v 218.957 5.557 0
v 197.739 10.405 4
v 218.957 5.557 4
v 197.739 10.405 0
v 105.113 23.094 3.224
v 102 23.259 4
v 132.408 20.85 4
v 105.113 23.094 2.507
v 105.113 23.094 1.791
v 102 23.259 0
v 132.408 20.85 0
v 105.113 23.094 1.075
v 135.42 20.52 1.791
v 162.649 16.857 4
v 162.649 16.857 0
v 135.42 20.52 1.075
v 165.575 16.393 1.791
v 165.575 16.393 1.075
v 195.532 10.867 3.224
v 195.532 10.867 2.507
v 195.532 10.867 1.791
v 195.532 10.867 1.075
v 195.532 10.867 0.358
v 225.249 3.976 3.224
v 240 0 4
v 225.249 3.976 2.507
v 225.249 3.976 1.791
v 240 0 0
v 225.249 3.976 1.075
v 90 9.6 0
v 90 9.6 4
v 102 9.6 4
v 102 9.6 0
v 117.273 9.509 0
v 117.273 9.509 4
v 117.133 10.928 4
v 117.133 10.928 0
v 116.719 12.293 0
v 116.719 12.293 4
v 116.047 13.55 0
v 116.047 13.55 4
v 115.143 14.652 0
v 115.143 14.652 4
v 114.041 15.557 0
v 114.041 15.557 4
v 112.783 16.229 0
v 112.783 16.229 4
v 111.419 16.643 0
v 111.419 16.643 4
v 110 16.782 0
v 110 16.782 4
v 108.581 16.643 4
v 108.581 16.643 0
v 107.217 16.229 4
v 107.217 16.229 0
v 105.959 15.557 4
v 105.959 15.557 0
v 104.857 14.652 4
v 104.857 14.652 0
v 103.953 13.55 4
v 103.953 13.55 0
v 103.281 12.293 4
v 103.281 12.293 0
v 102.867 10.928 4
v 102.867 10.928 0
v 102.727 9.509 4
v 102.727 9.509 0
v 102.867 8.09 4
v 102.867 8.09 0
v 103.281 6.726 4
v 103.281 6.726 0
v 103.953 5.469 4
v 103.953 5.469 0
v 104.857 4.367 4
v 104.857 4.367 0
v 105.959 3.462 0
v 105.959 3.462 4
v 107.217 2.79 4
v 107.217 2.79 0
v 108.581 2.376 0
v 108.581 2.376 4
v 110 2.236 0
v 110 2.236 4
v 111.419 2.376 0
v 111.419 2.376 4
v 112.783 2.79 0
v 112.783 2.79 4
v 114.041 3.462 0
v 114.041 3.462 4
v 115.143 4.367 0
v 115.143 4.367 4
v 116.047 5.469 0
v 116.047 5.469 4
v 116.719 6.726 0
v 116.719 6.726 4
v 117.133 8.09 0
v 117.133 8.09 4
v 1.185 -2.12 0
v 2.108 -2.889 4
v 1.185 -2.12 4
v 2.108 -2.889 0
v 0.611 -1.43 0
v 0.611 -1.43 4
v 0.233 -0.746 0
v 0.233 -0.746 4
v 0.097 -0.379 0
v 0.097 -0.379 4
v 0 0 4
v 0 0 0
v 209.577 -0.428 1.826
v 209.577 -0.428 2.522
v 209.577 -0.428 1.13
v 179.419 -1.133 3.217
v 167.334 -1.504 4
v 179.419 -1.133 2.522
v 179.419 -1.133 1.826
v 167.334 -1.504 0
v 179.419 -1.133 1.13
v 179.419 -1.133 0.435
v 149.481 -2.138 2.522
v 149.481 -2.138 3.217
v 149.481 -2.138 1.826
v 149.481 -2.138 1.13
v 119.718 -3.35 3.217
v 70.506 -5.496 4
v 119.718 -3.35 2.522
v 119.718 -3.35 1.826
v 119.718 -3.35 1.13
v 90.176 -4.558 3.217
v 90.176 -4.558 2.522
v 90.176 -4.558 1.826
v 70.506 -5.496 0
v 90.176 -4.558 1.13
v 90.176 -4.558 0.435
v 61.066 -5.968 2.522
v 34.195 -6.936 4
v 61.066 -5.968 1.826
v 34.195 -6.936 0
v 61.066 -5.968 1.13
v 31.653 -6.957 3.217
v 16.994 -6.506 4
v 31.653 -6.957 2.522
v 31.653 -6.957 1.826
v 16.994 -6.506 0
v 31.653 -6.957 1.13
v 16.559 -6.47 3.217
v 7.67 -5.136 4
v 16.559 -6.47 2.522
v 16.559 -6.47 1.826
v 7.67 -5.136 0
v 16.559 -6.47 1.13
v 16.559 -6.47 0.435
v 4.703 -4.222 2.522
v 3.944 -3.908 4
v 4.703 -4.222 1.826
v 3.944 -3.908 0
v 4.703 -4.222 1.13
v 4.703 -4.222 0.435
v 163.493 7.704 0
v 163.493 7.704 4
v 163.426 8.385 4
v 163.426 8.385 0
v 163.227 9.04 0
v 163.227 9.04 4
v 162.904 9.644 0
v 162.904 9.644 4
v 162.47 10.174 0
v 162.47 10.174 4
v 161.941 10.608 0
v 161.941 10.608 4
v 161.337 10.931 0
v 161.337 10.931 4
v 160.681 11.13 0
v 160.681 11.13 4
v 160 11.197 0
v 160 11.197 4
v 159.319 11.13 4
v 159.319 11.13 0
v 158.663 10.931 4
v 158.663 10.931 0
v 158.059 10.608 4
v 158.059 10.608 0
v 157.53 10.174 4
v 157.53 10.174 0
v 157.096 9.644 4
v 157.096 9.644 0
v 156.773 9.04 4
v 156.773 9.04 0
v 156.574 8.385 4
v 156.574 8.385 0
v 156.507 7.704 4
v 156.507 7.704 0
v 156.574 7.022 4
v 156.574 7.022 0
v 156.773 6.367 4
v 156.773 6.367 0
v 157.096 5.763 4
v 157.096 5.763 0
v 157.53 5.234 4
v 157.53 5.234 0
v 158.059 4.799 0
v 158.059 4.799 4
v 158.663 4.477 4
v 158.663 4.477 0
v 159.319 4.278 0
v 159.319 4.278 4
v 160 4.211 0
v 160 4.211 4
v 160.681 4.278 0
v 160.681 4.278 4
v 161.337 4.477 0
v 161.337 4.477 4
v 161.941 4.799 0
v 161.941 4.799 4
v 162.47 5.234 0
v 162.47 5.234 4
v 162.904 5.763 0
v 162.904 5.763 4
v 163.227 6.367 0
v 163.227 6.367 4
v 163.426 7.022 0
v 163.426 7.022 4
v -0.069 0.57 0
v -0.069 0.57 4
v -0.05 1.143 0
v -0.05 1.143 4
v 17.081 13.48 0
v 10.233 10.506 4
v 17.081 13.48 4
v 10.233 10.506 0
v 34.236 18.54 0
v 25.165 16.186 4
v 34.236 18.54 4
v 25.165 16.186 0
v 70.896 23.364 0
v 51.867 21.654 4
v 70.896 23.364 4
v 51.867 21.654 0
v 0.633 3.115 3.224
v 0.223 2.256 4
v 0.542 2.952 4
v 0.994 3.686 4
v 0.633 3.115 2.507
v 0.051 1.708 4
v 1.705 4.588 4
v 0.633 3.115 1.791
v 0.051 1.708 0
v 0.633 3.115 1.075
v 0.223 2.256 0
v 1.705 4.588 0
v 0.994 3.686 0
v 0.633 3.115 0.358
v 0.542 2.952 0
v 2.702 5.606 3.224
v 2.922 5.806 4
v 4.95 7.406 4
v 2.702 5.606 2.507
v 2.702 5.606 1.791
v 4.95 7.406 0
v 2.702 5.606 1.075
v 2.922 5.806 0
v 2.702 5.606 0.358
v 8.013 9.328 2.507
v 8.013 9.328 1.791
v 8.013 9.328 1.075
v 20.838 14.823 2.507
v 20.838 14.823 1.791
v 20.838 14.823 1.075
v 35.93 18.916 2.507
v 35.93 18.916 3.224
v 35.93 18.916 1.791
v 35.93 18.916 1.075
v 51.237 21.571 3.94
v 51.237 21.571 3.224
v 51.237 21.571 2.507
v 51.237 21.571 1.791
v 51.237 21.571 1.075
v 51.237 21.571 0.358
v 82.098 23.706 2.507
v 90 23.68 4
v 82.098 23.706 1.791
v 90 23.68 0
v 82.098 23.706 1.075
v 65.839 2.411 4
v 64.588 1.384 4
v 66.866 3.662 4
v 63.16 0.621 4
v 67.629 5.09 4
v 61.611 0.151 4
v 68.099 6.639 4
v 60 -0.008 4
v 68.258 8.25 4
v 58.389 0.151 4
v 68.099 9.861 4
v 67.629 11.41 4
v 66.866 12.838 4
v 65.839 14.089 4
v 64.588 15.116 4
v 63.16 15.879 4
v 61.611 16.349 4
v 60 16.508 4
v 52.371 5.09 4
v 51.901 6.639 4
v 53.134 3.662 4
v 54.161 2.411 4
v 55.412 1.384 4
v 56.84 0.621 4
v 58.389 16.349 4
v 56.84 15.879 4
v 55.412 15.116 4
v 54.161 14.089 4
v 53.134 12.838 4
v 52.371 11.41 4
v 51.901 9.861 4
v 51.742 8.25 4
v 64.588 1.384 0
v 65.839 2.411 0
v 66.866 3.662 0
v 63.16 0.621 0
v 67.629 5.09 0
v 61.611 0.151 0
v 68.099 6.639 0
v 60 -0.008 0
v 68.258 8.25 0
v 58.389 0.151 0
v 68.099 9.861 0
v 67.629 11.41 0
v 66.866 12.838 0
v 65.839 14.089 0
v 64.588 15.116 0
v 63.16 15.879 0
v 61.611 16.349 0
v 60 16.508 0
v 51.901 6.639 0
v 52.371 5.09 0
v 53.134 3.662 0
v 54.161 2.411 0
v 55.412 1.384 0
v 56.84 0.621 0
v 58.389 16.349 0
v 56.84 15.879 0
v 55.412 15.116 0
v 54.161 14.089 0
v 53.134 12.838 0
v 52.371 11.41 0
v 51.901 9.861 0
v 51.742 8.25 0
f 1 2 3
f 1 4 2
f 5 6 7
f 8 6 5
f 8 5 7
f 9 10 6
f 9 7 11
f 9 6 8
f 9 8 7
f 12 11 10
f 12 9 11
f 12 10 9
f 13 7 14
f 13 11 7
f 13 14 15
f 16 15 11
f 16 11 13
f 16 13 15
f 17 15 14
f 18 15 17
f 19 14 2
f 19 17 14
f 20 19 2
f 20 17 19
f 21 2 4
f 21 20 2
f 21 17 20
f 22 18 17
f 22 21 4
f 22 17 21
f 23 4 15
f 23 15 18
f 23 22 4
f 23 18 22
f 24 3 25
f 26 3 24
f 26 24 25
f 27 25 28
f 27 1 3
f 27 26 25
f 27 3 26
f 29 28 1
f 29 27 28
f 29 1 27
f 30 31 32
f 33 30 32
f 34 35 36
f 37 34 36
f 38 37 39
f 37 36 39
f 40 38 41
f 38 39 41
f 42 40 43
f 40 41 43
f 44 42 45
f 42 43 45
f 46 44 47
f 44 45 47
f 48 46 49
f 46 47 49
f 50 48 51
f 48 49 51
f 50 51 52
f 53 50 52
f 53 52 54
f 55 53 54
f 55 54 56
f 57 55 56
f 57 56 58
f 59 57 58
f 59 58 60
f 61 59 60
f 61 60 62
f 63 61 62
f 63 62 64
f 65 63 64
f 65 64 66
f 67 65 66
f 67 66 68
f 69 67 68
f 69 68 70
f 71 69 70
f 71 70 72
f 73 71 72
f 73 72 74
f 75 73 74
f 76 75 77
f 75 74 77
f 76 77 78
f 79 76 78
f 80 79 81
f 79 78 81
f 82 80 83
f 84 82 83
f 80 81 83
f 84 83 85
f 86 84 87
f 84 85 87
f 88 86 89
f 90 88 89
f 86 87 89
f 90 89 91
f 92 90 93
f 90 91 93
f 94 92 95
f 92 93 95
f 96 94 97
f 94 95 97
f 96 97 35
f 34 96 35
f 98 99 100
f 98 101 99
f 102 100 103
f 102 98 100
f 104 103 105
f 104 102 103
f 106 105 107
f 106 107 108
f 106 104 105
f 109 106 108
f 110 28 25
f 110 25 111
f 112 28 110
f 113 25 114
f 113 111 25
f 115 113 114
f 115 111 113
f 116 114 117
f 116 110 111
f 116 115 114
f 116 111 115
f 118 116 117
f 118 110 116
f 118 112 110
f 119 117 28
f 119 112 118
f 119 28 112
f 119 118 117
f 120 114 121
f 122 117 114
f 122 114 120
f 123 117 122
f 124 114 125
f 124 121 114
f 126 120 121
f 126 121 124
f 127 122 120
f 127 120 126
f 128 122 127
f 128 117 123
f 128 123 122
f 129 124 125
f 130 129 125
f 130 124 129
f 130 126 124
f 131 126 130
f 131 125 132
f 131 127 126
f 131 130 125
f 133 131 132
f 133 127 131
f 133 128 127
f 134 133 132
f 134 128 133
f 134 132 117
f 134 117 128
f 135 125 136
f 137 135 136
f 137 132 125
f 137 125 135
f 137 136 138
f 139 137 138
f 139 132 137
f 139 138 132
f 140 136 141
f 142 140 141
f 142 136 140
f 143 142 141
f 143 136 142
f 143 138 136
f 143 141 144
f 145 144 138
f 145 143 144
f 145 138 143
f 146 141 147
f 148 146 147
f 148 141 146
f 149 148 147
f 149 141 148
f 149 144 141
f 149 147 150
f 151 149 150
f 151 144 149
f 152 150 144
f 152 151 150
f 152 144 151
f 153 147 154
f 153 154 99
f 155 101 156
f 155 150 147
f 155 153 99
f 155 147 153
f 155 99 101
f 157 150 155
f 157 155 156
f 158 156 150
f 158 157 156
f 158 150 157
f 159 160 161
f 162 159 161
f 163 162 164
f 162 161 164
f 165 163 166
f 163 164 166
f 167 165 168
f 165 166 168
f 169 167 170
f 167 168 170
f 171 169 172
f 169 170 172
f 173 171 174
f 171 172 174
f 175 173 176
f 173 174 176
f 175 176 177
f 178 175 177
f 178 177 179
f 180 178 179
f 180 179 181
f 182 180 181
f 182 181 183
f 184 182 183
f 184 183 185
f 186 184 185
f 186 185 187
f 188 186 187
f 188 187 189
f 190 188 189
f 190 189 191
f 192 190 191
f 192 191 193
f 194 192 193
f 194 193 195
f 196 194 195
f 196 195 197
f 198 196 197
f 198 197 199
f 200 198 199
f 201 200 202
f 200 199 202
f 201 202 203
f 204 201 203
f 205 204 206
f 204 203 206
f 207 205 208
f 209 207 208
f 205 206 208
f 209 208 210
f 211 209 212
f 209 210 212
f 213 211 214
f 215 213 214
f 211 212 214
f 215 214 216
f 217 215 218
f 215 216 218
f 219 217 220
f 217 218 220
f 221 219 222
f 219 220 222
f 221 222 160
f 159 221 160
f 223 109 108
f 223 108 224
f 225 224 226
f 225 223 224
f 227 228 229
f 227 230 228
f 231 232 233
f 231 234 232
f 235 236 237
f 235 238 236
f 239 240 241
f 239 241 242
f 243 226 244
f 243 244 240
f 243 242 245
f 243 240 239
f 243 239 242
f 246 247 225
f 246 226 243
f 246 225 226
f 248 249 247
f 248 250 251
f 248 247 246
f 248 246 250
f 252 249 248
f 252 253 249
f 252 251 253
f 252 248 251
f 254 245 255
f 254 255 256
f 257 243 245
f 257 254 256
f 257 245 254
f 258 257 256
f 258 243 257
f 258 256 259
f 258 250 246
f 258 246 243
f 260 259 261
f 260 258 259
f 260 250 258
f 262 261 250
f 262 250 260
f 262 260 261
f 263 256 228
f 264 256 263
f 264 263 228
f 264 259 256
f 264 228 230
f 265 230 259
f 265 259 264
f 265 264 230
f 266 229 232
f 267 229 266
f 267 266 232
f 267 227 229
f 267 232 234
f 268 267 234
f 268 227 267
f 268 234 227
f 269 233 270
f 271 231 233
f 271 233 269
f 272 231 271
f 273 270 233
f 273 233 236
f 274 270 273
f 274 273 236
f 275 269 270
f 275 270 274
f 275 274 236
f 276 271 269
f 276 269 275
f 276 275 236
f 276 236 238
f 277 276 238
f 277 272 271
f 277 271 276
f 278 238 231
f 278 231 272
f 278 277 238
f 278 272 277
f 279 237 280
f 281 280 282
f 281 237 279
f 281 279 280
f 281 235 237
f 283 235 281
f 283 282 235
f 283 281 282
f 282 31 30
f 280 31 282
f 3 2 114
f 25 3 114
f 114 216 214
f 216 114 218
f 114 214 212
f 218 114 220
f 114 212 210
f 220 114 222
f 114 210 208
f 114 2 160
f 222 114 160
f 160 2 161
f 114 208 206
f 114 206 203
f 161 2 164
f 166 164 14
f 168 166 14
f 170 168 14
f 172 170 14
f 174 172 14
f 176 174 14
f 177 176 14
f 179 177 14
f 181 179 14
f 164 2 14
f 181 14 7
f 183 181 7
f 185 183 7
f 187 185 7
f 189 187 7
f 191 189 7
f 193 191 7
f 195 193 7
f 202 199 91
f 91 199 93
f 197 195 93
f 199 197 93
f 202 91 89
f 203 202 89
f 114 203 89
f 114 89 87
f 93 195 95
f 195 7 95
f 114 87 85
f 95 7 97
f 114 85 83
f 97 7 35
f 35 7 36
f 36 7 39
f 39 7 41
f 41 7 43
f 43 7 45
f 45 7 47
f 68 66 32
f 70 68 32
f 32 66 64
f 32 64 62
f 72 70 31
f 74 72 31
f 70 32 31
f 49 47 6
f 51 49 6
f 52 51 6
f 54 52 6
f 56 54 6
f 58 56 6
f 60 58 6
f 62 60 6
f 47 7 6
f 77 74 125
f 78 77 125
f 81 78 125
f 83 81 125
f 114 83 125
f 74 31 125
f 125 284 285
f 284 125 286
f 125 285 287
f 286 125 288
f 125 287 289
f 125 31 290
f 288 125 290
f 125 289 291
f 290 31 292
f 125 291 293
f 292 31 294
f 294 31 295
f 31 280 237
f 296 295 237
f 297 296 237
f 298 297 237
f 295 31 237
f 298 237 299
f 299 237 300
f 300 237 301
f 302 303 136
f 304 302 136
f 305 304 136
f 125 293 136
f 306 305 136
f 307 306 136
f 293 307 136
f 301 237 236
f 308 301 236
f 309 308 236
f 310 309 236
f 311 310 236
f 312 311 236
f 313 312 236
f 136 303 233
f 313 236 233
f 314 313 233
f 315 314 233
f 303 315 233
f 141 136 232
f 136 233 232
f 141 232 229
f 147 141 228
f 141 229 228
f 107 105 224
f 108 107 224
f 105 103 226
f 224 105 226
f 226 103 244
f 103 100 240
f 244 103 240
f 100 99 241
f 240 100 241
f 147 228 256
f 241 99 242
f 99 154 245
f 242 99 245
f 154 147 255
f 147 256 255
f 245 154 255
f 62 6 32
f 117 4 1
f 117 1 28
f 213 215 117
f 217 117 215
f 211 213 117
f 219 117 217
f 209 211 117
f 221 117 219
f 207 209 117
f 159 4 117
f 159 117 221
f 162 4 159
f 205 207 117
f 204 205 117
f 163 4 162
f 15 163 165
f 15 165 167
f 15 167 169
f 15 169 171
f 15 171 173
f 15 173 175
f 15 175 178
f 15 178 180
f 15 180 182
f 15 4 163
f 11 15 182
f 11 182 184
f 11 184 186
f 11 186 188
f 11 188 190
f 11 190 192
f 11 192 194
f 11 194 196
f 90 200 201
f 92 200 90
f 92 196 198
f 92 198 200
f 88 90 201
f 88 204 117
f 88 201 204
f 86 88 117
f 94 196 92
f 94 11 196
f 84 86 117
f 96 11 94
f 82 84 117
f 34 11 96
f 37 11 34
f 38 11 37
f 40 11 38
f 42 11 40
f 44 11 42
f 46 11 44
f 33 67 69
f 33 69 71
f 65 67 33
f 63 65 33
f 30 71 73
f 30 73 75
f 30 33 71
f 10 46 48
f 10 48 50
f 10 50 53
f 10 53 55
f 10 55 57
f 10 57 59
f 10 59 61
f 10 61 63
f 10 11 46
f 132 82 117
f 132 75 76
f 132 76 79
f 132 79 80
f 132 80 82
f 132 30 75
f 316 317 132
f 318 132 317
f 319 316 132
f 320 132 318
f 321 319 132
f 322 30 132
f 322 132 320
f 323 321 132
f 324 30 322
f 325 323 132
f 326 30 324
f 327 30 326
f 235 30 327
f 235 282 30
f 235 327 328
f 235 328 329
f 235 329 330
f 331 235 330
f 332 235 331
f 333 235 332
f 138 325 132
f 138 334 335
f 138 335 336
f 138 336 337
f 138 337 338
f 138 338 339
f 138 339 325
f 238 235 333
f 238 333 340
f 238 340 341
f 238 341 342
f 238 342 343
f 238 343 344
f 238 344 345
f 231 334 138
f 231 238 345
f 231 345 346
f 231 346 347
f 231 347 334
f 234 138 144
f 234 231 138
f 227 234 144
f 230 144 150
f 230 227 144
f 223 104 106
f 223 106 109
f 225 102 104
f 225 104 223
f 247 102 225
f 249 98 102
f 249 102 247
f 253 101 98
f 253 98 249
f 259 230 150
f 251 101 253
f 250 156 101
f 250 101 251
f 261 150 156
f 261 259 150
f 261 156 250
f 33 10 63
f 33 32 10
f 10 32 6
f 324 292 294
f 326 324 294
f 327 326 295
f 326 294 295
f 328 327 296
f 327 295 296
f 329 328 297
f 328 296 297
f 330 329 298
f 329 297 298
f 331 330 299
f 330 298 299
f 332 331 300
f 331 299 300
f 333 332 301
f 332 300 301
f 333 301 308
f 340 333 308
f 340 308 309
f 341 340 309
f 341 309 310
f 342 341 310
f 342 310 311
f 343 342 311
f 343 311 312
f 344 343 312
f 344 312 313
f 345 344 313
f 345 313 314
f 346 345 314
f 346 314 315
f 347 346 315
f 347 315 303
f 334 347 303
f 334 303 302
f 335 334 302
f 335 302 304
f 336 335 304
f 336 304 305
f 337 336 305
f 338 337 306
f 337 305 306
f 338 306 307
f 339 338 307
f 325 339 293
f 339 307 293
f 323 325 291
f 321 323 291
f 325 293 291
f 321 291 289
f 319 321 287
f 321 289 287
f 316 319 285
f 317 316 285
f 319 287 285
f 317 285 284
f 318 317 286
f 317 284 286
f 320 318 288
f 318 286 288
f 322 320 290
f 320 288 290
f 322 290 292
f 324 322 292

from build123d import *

# Parameters (mm, degrees)
EXTRUDE_1_DEPTH     = 4
SKETCH_2_R          = 8.258
CUT_EXTRUDE_1_DEPTH = 242.202600441
SKETCH_3_R          = 7.273
CUT_EXTRUDE_2_DEPTH = 242.202600441
SKETCH_4_R          = 3.493
CUT_EXTRUDE_3_DEPTH = 242.202600441
SKETCH_6_W          = 12
SKETCH_6_H          = 16
CUT_EXTRUDE_5_DEPTH = 241.074


with BuildPart() as part:
    # 草图1 → 凸台-拉伸1 (new body)
    with BuildSketch(Plane.XY):
        with BuildLine():
            add(Edge.make_bspline(
                [(0, 0), (-0.005288637, 0.027306965), (-0.012766006, 0.065915068), (-0.022153323, 0.120712697), (-0.030210585, 0.170851793), (-0.040453144, 0.241913365), (-0.052682719, 0.342725743), (-0.065440984, 0.485978709), (-0.074387813, 0.690065352), (-0.0686987, 0.982013321), (-0.033036091, 1.312214714), (0.030597532, 1.635567859), (0.121591356, 1.976920534), (0.250371604, 2.342321824), (0.472341281, 2.838466056), (0.773081644, 3.370456853), (1.161583787, 3.931187821), (1.559387095, 4.428056884), (2.091714531, 5.022476136), (2.777798061, 5.692302492), (3.627283356, 6.418758526), (4.764693829, 7.29468167), (6.21745515, 8.278032448), (7.997488076, 9.336645637), (9.795579221, 10.298627307), (11.608712321, 11.184679179), (13.434634677, 12.008148722), (15.271537967, 12.778295153), (17.729476359, 13.741402594), (20.82544579, 14.843263376), (24.571919444, 16.030165468), (28.339560161, 17.0985386), (32.12487346, 18.061784525), (35.925100546, 18.929826892), (39.737940185, 19.71030891), (43.561453276, 20.409312511), (47.393975172, 21.031785496), (51.234054288, 21.581857689), (55.080411196, 22.063026744), (58.93190557, 22.478304615), (62.787513331, 22.830322648), (66.646308068, 23.121396522), (70.507447303, 23.353594238), (74.370160091, 23.528775696), (78.233740528, 23.64862295), (82.097536671, 23.71465077), (85.960951375, 23.728342975), (89.823414351, 23.690681955), (93.676431779, 23.604193967), (98.773727292, 23.420984207), (105.114156567, 23.11272469), (112.702347417, 22.628659762), (120.283713822, 22.034341773), (127.857230034, 21.335464614), (135.421970656, 20.536435505), (142.977108491, 19.641124977), (150.521889929, 18.652745922), (158.055616957, 17.573950453), (165.577630234, 16.40685992), (173.087293464, 15.153093694), (180.583977279, 13.813795243), (188.067047998, 12.389661186), (195.535844753, 10.880930145), (202.989689487, 9.287480887), (210.42779734, 7.608573405), (217.849539663, 5.84383764), (225.253408528, 3.989662589), (232.640819939, 2.052702909), (237.546398163, 0.684385432), (240, 0)],
                knots=[0, 0, 0, 0, 0.000334769, 0.000473316, 0.000669154, 0.000945993, 0.001337428, 0.001891329, 0.00267667, 0.003795116, 0.005402936, 0.006666891, 0.007758358, 0.009652829, 0.011322553, 0.014295747, 0.016992284, 0.019525911, 0.021951885, 0.026593, 0.031053929, 0.035398825, 0.043866662, 0.052149912, 0.06031708, 0.068404975, 0.076435568, 0.084422966, 0.092376749, 0.108208031, 0.123966084, 0.139671769, 0.155338281, 0.170974475, 0.186586558, 0.202179035, 0.217755286, 0.23331791, 0.248868948, 0.264410046, 0.279942548, 0.295467586, 0.310986112, 0.326498966, 0.342006877, 0.357510513, 0.373010481, 0.388507334, 0.404001612, 0.419397139, 0.449898857, 0.480404337, 0.510913986, 0.541428053, 0.571946709, 0.602470142, 0.632998582, 0.663532351, 0.694071887, 0.72461776, 0.755170709, 0.785731637, 0.816301636, 0.846881995, 0.877474214, 0.90808002, 0.938701381, 0.969340535, 1, 1, 1, 1], degree=3))
            add(Edge.make_bspline(
                [(240, 0), (234.917110018, -0.057585286), (224.775588822, -0.172481024), (209.598003822, -0.415904891), (194.487002613, -0.728245316), (179.43634205, -1.119488516), (164.440499209, -1.588334416), (149.494278082, -2.127659731), (134.592329132, -2.722835319), (119.728536963, -3.349183783), (107.362573716, -3.873637958), (97.514772, -4.261389001), (87.760339877, -4.645426988), (75.622774809, -5.230840469), (63.487065009, -5.85519136), (53.755908235, -6.320131596), (46.424136767, -6.628108223), (39.053992561, -6.865167611), (32.880602935, -6.967424), (27.910517319, -6.957709617), (24.15127632, -6.890661049), (20.363099883, -6.745172216), (17.186217127, -6.535965403), (14.625579122, -6.293161259), (12.683505874, -6.062687015), (10.723085806, -5.771507493), (8.738176655, -5.399451237), (7.07063002, -4.997986268), (5.721860643, -4.593172323), (4.684001624, -4.227462917), (3.812952451, -3.858710942), (3.107354908, -3.505548627), (2.55876921, -3.193744289), (1.993245962, -2.820474949), (1.51744672, -2.442105711), (1.126053407, -2.067776646), (0.868943424, -1.77917403), (0.655201004, -1.498576542), (0.473117664, -1.22421341), (0.31383558, -0.932970965), (0.19658861, -0.665620959), (0.12645379, -0.47377542), (0.083168463, -0.336628772), (0.05569496, -0.238865361), (0.037823046, -0.169329158), (0.025977828, -0.119947575), (0.013567454, -0.065754641), (0.005620681, -0.027240622), (0, 0)],
                knots=[0, 0, 0, 0, 0.062942783, 0.125585163, 0.18795959, 0.250093756, 0.31201177, 0.373735315, 0.435284959, 0.496681733, 0.557949376, 0.588543732, 0.618716521, 0.678826646, 0.739009654, 0.769185836, 0.799459682, 0.829874332, 0.86049191, 0.875906175, 0.891414582, 0.90704545, 0.922843998, 0.930829512, 0.938892479, 0.947057741, 0.955366051, 0.963891837, 0.968280742, 0.972798276, 0.977511782, 0.979981449, 0.982565286, 0.985320539, 0.988364768, 0.990077086, 0.992021988, 0.99314336, 0.994442585, 0.996095981, 0.99724642, 0.998054303, 0.998624116, 0.999026805, 0.999311606, 0.999513077, 0.999655604, 1, 1, 1, 1], degree=3))
        make_face()
    extrude(amount=EXTRUDE_1_DEPTH)

    # 草图2 → 切除-拉伸1 (cut, through all)
    with BuildSketch(Plane.XY.offset(4)):
        with Locations((60, 8.25)):
            Circle(SKETCH_2_R)
    extrude(amount=-CUT_EXTRUDE_1_DEPTH, mode=Mode.SUBTRACT)

    # 草图3 → 切除-拉伸2 (cut, through all)
    with BuildSketch(Plane.XY.offset(4)):
        with Locations((110, 9.5093)):
            Circle(SKETCH_3_R)
    extrude(amount=-CUT_EXTRUDE_2_DEPTH, mode=Mode.SUBTRACT)

    # 草图4 → 切除-拉伸3 (cut, through all)
    with BuildSketch(Plane.XY.offset(4)):
        with Locations((160, 7.7037)):
            Circle(SKETCH_4_R)
    extrude(amount=-CUT_EXTRUDE_3_DEPTH, mode=Mode.SUBTRACT)

    # 草图6 → 切除-拉伸5 (cut, symmetric)
    with BuildSketch(Plane.XY):
        with Locations((96, 17.6)):
            Rectangle(SKETCH_6_W, SKETCH_6_H)
    extrude(amount=CUT_EXTRUDE_5_DEPTH, both=True, mode=Mode.SUBTRACT)


solid = part.part
